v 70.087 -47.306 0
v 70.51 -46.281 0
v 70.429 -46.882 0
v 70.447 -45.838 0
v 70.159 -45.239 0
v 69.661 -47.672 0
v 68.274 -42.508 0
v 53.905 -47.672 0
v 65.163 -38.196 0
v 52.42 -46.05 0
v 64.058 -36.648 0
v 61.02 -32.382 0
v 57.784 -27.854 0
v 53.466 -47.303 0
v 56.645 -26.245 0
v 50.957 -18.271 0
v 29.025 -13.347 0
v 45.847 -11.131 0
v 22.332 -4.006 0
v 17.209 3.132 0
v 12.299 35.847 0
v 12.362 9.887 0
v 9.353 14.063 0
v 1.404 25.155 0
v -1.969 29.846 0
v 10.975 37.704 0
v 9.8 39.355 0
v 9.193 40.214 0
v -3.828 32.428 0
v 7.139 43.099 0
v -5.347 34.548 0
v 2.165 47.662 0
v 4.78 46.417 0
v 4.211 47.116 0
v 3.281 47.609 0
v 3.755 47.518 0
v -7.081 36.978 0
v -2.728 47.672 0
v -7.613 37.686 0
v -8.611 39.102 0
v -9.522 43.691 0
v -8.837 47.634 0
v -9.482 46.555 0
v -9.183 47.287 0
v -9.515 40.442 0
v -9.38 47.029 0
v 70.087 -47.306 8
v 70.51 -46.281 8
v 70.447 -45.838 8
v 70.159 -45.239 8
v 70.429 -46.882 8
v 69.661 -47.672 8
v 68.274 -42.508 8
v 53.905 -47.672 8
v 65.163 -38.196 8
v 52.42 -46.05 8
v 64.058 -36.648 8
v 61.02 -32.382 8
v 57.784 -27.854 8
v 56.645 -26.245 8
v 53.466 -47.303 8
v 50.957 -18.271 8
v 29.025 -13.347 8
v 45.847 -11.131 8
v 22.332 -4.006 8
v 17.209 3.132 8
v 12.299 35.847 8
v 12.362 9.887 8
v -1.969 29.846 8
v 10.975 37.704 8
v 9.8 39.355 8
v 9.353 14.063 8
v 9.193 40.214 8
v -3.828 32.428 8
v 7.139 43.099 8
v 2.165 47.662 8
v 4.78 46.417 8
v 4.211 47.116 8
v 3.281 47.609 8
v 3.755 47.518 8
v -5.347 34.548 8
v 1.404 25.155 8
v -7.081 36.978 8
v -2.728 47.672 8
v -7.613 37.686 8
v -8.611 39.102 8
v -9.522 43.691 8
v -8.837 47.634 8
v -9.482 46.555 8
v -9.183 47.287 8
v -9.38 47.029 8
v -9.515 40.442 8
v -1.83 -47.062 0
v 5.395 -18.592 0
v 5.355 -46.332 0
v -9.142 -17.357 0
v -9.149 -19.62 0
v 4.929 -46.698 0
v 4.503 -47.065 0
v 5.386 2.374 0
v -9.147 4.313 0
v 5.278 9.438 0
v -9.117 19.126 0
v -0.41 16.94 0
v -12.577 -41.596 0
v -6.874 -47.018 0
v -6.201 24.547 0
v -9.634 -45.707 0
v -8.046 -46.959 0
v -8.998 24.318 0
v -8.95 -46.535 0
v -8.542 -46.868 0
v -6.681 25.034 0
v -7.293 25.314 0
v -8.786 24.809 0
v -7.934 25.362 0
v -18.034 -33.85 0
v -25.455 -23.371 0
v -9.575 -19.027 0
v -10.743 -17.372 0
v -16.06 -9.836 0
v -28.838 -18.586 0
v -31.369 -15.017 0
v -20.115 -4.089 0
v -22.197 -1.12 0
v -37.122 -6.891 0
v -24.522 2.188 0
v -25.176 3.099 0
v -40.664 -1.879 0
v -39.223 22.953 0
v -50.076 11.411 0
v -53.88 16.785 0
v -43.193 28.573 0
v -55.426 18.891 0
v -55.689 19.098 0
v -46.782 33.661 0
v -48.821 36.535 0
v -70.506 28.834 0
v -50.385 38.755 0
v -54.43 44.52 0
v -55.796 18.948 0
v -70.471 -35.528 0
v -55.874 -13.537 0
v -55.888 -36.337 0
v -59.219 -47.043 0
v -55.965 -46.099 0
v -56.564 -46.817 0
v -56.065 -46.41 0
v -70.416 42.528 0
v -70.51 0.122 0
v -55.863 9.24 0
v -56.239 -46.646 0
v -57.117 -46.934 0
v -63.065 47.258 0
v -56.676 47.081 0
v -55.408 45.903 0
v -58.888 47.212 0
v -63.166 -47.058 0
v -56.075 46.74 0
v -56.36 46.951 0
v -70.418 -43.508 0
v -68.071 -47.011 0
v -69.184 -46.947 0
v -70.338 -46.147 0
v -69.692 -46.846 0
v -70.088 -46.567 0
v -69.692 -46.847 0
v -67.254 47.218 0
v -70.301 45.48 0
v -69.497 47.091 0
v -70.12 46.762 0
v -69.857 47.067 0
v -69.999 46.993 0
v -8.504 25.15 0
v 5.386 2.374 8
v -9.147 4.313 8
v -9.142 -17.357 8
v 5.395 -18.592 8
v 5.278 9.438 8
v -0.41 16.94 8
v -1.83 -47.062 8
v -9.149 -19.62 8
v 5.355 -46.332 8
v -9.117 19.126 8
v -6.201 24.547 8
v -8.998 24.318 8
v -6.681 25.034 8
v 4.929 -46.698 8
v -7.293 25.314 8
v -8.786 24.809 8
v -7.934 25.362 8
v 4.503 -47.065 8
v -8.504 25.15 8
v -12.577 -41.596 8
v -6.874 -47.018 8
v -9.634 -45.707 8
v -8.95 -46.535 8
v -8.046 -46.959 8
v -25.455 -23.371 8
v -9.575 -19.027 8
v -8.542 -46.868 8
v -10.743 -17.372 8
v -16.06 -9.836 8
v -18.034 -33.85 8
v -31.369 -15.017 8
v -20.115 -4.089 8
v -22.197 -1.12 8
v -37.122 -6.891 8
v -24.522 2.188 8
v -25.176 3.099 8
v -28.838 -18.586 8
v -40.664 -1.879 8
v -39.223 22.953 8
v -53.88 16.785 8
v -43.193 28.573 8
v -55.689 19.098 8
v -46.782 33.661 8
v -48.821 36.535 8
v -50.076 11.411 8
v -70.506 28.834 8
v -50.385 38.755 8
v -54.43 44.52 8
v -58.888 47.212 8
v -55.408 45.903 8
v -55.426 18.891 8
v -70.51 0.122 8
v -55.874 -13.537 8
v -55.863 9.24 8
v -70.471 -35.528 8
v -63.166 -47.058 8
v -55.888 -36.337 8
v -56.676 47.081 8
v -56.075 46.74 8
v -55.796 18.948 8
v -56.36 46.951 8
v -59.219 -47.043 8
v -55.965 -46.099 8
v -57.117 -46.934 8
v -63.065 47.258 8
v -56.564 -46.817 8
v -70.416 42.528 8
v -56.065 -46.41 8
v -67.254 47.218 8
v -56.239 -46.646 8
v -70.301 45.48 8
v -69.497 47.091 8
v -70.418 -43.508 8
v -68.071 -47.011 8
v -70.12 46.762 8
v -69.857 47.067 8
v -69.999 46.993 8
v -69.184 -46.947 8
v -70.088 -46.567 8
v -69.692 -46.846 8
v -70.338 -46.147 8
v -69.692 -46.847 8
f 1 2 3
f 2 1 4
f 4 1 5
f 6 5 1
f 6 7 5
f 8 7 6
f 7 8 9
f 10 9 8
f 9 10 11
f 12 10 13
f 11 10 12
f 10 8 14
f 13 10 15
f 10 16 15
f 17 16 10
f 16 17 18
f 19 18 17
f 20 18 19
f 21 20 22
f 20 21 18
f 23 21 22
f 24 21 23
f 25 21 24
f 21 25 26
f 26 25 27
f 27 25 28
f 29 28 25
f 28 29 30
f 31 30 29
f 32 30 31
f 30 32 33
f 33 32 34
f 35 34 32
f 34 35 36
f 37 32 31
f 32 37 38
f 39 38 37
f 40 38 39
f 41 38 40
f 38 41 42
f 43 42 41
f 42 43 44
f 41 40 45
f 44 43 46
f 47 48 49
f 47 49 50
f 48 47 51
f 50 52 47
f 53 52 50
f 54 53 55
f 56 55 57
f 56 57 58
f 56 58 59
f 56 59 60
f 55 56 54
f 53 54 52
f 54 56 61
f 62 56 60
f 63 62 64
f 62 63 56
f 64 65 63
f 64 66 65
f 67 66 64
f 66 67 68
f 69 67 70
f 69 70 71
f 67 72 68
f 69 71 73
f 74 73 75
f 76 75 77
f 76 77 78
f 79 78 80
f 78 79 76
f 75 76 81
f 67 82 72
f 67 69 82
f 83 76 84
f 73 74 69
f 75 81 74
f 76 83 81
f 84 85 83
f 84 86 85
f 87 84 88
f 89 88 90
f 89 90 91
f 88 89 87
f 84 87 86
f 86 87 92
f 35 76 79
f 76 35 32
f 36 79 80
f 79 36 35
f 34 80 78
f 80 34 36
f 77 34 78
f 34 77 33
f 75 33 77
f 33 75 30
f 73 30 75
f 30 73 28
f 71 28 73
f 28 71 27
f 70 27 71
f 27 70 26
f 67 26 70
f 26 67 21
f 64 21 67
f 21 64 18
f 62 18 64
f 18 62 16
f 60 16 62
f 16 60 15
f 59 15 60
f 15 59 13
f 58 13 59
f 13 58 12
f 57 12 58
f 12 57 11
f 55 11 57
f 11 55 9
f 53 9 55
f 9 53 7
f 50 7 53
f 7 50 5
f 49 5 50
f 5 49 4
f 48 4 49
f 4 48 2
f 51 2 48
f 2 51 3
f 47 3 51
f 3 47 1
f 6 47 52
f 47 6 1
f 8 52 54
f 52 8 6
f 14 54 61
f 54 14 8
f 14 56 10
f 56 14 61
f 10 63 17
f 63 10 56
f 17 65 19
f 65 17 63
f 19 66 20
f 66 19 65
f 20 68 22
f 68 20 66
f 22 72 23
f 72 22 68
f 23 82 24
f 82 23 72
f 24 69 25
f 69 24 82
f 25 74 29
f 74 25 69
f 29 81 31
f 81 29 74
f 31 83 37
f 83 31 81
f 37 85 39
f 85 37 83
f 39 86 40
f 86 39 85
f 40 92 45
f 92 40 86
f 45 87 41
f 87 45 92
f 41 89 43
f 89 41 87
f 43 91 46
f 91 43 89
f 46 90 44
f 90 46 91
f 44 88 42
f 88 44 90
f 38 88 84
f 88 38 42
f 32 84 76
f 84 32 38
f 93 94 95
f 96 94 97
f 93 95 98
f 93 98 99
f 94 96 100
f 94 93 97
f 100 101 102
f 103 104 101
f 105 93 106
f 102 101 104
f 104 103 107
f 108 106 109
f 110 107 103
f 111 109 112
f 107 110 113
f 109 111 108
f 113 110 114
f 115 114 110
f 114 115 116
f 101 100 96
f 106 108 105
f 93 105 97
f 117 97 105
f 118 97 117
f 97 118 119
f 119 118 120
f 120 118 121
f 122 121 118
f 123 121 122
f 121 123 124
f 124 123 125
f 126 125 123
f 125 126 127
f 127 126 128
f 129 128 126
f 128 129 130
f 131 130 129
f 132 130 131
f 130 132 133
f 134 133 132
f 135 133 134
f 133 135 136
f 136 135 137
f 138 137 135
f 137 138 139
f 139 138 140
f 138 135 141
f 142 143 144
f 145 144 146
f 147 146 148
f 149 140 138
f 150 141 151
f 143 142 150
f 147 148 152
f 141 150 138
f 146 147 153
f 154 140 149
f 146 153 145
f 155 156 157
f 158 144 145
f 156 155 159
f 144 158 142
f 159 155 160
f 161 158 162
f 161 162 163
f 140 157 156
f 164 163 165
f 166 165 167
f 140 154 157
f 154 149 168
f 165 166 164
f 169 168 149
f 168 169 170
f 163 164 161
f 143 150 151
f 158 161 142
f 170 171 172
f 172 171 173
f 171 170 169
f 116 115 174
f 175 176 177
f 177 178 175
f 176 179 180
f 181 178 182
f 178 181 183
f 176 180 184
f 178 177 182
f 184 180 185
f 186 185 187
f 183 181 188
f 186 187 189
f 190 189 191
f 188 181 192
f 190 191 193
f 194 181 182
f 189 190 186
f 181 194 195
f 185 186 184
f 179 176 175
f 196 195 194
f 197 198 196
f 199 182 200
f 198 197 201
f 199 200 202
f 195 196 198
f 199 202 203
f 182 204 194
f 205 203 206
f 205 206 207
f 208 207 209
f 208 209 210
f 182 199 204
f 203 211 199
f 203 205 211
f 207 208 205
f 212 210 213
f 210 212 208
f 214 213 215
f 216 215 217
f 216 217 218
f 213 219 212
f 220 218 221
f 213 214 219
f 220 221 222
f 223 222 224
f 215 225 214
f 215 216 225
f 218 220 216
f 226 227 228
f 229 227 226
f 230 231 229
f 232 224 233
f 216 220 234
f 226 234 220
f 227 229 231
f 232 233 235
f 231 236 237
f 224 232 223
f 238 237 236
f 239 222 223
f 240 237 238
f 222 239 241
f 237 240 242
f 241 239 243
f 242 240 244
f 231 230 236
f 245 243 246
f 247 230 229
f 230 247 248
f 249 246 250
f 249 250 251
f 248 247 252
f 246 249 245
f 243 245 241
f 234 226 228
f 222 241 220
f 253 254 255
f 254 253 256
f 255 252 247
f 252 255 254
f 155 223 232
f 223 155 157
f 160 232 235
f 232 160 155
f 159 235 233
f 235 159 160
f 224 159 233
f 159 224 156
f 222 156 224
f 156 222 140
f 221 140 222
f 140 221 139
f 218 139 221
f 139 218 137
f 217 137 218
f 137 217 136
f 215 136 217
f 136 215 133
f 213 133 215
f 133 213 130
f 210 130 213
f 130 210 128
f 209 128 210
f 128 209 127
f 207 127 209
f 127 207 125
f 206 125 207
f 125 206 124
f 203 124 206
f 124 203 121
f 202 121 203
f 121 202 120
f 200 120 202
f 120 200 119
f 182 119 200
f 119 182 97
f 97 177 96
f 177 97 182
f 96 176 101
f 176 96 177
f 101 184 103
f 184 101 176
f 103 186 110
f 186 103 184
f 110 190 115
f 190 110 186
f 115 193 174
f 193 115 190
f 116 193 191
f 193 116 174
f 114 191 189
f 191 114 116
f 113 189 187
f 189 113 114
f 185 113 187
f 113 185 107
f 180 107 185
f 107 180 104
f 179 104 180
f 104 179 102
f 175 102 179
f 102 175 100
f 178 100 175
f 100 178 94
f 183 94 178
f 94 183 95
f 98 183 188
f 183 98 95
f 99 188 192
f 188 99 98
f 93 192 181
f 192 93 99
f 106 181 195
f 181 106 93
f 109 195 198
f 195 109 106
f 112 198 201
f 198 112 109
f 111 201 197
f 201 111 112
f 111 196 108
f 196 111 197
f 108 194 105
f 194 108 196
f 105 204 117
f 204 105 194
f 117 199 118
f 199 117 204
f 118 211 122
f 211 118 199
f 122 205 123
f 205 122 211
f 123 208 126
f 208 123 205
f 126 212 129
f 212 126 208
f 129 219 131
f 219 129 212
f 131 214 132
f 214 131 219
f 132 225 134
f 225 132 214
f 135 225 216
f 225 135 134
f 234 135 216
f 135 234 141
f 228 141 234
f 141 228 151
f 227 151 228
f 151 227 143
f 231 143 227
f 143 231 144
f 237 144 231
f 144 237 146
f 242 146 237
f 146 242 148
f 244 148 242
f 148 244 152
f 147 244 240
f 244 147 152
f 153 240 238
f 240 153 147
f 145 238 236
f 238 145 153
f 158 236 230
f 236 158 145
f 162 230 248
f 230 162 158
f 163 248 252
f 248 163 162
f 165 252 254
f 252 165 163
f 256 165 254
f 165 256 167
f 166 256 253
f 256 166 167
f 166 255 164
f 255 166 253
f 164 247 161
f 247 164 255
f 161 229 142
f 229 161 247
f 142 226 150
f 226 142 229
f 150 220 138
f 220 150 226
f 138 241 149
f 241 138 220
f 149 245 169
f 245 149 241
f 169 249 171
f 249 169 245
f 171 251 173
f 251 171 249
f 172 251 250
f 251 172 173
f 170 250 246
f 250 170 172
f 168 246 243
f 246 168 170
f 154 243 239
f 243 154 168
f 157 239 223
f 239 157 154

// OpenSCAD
// Module names are of the form poly_<inkscape-path-id>().  As a result,
// you can associate a polygon in this OpenSCAD program with the corresponding
// SVG element in the Inkscape document by looking for the XML element with
// the attribute id="inkscape-path-id".

// fudge value is used to ensure that subtracted solids are a tad taller
// in the z dimension than the polygon being subtracted from.  This helps
// keep the resulting .stl file manifold.
fudge = 0.1;

module poly_path2996(h)
{
  scale([25.4/90, -25.4/90, 1]) union()
  {
    difference()
    {
       linear_extrude(height=h)
         polygon([[189.445700,167.607890],[185.740650,163.167990],[102.844000,47.292110],[79.128990,14.194930],[60.978390,-11.098850],[43.802290,-35.031640],[33.139190,-49.831190],[4.974570,-89.132850],[-6.977240,-105.753020],[-13.565450,-114.901830],[-18.947100,-122.415150],[-25.090240,-131.025800],[-26.973820,-133.531500],[-30.510210,-138.549320],[-33.713830,-143.298060],[-33.739230,-154.809780],[-33.598669,-164.957285],[-33.236604,-166.637968],[-32.539260,-167.551420],[-31.313930,-168.781340],[-9.667230,-168.917490],[7.671024,-168.880365],[11.624538,-168.693064],[13.306540,-168.372570],[14.920346,-166.945043],[16.936820,-164.469270],[25.296740,-152.714460],[32.572880,-142.489310],[34.725540,-139.448310],[38.887740,-133.597190],[43.578030,-127.015980],[162.451560,39.439180],[180.556420,64.739030],[200.711360,92.992720],[204.747600,98.694610],[216.213270,114.738120],[226.976580,129.856190],[230.892540,135.339390],[241.914340,150.619890],[248.593957,160.294552],[249.616383,162.417498],[249.838010,163.986090],[249.551989,166.117877],[248.338630,167.618690],[246.828700,168.917490],[218.915400,168.917490],[191.002100,168.917490],[189.445680,167.607890]]);
/*
       translate([0, 0, -fudge])
         linear_extrude(height=h+2*fudge)
           polygon([[247.370880,166.546890],[248.065952,165.794738],[248.443792,164.978467],[248.455775,163.983716],[248.053274,162.696128],[245.810321,158.784995],[241.325930,152.330190],[124.002740,-12.023370],[45.928740,-121.150644],[12.891880,-166.841500],[6.068970,-167.398836],[-7.635745,-167.756490],[-21.573305,-167.814482],[-29.094750,-167.472830],[-31.154174,-166.570289],[-31.811122,-165.807892],[-32.260093,-164.684970],[-32.655690,-160.898229],[-32.584150,-154.291420],[-31.894520,-143.698760],[0.257891,-98.302479],[76.939460,8.871160],[187.721740,163.385890],[189.805272,165.903490],[191.457690,167.254990],[199.719222,167.606178],[219.520810,167.674090],[242.581452,167.440190],[246.141910,167.121209],[247.370880,166.546890]]);
*/  
  }

    difference()
    {
       linear_extrude(height=h)
         polygon([[-246.940340,165.992990],[-248.342455,165.000065],[-249.227550,163.511990],[-249.512757,154.162379],[-249.701511,125.885704],[-249.838010,-0.433100],[-249.825997,-102.167790],[-249.506839,-150.690710],[-249.099369,-161.150594],[-248.455859,-165.690940],[-248.029000,-166.510391],[-247.523224,-166.772883],[-246.248380,-166.857560],[-238.299873,-167.309251],[-223.460000,-167.449981],[-208.657402,-167.285351],[-200.820720,-166.820960],[-199.701913,-166.361019],[-198.689695,-165.614514],[-196.325870,-162.650180],[-192.862350,-157.748980],[-178.531090,-137.322050],[-172.988330,-129.455570],[-165.761310,-119.270150],[-153.045970,-101.241610],[-138.979000,-81.329480],[-89.205020,-10.980870],[-86.888290,-7.751880],[-78.651700,3.969750],[-71.272050,14.487630],[-56.905680,34.851850],[-38.065180,61.553460],[-33.928670,67.419480],[-32.419150,69.518350],[-32.392050,61.499660],[-32.409050,-15.283530],[-32.302940,-67.768307],[-31.882490,-86.167130],[-31.132681,-87.906656],[-30.131240,-89.113180],[-28.112270,-89.863896],[-25.840068,-89.695529],[-23.673799,-88.702092],[-21.972630,-86.977600],[-1.451740,-60.023850],[18.701620,-33.442130],[19.082983,-8.411489],[19.114560,65.878050],[18.975690,164.167290],[17.465730,165.466090],[15.955760,166.764790],[-6.482640,166.754790],[-24.358142,166.600265],[-28.507834,166.390656],[-30.266450,166.068190],[-31.710878,164.886576],[-34.136510,161.952428],[-44.562470,147.388790],[-63.900290,119.942390],[-90.193130,82.808940],[-102.181800,65.856730],[-111.149440,53.209840],[-131.533140,24.417980],[-144.086660,6.658520],[-177.433960,-40.430960],[-190.912440,-59.474470],[-196.390216,-66.937157],[-197.324199,-67.671361],[-197.702830,-67.138780],[-197.940583,-32.739331],[-197.977740,47.967270],[-198.029345,128.752930],[-198.301780,163.342490],[-198.657242,164.446108],[-199.272434,165.282537],[-200.422363,165.888411],[-202.382035,166.300365],[-209.830634,166.689056],[-223.818280,166.741690],[-241.197460,166.575040],[-245.139184,166.347518],[-246.940300,165.990790]]);
/*
       translate([0, 0, -fudge])
         linear_extrude(height=h+2*fudge)
           polygon([[-200.548840,163.909490],[-199.250460,162.399490],[-199.250460,45.339090],[-199.115210,-51.645501],[-198.876173,-67.779763],[-198.693391,-70.777890],[-198.460660,-71.547350],[-191.474785,-62.334512],[-175.788040,-40.428840],[-146.262660,1.278990],[-92.151810,77.698490],[-38.130030,153.995990],[-31.555840,162.889778],[-29.924685,164.544707],[-28.672490,165.196990],[-21.785211,165.567703],[-5.659770,165.588090],[15.448860,165.419490],[16.674090,164.193690],[17.899320,162.967790],[17.899320,65.166770],[17.899320,-32.634280],[-2.480450,-59.269050],[-24.007070,-87.081910],[-25.422576,-88.201806],[-26.823910,-88.662932],[-28.173097,-88.461700],[-29.432160,-87.594520],[-30.804660,-86.222030],[-30.804660,-7.087240],[-30.940451,57.456411],[-31.164557,69.048835],[-31.541130,72.047550],[-35.215323,67.581618],[-43.014830,56.844380],[-166.343780,-117.655790],[-191.716140,-153.602550],[-197.590424,-161.589666],[-200.755730,-165.247220],[-207.194786,-165.675852],[-223.732300,-165.821600],[-245.472670,-165.821600],[-246.982640,-164.522780],[-248.492600,-163.223970],[-248.492600,-0.169720],[-248.356339,140.770176],[-248.058621,160.110179],[-247.815210,163.108608],[-247.494610,163.987290],[-246.450590,164.835065],[-245.341950,165.324790],[-223.017240,165.489390],[-201.847210,165.419390],[-200.548840,163.909390]]);
*/
    }
  }
}

poly_path2996(8);
